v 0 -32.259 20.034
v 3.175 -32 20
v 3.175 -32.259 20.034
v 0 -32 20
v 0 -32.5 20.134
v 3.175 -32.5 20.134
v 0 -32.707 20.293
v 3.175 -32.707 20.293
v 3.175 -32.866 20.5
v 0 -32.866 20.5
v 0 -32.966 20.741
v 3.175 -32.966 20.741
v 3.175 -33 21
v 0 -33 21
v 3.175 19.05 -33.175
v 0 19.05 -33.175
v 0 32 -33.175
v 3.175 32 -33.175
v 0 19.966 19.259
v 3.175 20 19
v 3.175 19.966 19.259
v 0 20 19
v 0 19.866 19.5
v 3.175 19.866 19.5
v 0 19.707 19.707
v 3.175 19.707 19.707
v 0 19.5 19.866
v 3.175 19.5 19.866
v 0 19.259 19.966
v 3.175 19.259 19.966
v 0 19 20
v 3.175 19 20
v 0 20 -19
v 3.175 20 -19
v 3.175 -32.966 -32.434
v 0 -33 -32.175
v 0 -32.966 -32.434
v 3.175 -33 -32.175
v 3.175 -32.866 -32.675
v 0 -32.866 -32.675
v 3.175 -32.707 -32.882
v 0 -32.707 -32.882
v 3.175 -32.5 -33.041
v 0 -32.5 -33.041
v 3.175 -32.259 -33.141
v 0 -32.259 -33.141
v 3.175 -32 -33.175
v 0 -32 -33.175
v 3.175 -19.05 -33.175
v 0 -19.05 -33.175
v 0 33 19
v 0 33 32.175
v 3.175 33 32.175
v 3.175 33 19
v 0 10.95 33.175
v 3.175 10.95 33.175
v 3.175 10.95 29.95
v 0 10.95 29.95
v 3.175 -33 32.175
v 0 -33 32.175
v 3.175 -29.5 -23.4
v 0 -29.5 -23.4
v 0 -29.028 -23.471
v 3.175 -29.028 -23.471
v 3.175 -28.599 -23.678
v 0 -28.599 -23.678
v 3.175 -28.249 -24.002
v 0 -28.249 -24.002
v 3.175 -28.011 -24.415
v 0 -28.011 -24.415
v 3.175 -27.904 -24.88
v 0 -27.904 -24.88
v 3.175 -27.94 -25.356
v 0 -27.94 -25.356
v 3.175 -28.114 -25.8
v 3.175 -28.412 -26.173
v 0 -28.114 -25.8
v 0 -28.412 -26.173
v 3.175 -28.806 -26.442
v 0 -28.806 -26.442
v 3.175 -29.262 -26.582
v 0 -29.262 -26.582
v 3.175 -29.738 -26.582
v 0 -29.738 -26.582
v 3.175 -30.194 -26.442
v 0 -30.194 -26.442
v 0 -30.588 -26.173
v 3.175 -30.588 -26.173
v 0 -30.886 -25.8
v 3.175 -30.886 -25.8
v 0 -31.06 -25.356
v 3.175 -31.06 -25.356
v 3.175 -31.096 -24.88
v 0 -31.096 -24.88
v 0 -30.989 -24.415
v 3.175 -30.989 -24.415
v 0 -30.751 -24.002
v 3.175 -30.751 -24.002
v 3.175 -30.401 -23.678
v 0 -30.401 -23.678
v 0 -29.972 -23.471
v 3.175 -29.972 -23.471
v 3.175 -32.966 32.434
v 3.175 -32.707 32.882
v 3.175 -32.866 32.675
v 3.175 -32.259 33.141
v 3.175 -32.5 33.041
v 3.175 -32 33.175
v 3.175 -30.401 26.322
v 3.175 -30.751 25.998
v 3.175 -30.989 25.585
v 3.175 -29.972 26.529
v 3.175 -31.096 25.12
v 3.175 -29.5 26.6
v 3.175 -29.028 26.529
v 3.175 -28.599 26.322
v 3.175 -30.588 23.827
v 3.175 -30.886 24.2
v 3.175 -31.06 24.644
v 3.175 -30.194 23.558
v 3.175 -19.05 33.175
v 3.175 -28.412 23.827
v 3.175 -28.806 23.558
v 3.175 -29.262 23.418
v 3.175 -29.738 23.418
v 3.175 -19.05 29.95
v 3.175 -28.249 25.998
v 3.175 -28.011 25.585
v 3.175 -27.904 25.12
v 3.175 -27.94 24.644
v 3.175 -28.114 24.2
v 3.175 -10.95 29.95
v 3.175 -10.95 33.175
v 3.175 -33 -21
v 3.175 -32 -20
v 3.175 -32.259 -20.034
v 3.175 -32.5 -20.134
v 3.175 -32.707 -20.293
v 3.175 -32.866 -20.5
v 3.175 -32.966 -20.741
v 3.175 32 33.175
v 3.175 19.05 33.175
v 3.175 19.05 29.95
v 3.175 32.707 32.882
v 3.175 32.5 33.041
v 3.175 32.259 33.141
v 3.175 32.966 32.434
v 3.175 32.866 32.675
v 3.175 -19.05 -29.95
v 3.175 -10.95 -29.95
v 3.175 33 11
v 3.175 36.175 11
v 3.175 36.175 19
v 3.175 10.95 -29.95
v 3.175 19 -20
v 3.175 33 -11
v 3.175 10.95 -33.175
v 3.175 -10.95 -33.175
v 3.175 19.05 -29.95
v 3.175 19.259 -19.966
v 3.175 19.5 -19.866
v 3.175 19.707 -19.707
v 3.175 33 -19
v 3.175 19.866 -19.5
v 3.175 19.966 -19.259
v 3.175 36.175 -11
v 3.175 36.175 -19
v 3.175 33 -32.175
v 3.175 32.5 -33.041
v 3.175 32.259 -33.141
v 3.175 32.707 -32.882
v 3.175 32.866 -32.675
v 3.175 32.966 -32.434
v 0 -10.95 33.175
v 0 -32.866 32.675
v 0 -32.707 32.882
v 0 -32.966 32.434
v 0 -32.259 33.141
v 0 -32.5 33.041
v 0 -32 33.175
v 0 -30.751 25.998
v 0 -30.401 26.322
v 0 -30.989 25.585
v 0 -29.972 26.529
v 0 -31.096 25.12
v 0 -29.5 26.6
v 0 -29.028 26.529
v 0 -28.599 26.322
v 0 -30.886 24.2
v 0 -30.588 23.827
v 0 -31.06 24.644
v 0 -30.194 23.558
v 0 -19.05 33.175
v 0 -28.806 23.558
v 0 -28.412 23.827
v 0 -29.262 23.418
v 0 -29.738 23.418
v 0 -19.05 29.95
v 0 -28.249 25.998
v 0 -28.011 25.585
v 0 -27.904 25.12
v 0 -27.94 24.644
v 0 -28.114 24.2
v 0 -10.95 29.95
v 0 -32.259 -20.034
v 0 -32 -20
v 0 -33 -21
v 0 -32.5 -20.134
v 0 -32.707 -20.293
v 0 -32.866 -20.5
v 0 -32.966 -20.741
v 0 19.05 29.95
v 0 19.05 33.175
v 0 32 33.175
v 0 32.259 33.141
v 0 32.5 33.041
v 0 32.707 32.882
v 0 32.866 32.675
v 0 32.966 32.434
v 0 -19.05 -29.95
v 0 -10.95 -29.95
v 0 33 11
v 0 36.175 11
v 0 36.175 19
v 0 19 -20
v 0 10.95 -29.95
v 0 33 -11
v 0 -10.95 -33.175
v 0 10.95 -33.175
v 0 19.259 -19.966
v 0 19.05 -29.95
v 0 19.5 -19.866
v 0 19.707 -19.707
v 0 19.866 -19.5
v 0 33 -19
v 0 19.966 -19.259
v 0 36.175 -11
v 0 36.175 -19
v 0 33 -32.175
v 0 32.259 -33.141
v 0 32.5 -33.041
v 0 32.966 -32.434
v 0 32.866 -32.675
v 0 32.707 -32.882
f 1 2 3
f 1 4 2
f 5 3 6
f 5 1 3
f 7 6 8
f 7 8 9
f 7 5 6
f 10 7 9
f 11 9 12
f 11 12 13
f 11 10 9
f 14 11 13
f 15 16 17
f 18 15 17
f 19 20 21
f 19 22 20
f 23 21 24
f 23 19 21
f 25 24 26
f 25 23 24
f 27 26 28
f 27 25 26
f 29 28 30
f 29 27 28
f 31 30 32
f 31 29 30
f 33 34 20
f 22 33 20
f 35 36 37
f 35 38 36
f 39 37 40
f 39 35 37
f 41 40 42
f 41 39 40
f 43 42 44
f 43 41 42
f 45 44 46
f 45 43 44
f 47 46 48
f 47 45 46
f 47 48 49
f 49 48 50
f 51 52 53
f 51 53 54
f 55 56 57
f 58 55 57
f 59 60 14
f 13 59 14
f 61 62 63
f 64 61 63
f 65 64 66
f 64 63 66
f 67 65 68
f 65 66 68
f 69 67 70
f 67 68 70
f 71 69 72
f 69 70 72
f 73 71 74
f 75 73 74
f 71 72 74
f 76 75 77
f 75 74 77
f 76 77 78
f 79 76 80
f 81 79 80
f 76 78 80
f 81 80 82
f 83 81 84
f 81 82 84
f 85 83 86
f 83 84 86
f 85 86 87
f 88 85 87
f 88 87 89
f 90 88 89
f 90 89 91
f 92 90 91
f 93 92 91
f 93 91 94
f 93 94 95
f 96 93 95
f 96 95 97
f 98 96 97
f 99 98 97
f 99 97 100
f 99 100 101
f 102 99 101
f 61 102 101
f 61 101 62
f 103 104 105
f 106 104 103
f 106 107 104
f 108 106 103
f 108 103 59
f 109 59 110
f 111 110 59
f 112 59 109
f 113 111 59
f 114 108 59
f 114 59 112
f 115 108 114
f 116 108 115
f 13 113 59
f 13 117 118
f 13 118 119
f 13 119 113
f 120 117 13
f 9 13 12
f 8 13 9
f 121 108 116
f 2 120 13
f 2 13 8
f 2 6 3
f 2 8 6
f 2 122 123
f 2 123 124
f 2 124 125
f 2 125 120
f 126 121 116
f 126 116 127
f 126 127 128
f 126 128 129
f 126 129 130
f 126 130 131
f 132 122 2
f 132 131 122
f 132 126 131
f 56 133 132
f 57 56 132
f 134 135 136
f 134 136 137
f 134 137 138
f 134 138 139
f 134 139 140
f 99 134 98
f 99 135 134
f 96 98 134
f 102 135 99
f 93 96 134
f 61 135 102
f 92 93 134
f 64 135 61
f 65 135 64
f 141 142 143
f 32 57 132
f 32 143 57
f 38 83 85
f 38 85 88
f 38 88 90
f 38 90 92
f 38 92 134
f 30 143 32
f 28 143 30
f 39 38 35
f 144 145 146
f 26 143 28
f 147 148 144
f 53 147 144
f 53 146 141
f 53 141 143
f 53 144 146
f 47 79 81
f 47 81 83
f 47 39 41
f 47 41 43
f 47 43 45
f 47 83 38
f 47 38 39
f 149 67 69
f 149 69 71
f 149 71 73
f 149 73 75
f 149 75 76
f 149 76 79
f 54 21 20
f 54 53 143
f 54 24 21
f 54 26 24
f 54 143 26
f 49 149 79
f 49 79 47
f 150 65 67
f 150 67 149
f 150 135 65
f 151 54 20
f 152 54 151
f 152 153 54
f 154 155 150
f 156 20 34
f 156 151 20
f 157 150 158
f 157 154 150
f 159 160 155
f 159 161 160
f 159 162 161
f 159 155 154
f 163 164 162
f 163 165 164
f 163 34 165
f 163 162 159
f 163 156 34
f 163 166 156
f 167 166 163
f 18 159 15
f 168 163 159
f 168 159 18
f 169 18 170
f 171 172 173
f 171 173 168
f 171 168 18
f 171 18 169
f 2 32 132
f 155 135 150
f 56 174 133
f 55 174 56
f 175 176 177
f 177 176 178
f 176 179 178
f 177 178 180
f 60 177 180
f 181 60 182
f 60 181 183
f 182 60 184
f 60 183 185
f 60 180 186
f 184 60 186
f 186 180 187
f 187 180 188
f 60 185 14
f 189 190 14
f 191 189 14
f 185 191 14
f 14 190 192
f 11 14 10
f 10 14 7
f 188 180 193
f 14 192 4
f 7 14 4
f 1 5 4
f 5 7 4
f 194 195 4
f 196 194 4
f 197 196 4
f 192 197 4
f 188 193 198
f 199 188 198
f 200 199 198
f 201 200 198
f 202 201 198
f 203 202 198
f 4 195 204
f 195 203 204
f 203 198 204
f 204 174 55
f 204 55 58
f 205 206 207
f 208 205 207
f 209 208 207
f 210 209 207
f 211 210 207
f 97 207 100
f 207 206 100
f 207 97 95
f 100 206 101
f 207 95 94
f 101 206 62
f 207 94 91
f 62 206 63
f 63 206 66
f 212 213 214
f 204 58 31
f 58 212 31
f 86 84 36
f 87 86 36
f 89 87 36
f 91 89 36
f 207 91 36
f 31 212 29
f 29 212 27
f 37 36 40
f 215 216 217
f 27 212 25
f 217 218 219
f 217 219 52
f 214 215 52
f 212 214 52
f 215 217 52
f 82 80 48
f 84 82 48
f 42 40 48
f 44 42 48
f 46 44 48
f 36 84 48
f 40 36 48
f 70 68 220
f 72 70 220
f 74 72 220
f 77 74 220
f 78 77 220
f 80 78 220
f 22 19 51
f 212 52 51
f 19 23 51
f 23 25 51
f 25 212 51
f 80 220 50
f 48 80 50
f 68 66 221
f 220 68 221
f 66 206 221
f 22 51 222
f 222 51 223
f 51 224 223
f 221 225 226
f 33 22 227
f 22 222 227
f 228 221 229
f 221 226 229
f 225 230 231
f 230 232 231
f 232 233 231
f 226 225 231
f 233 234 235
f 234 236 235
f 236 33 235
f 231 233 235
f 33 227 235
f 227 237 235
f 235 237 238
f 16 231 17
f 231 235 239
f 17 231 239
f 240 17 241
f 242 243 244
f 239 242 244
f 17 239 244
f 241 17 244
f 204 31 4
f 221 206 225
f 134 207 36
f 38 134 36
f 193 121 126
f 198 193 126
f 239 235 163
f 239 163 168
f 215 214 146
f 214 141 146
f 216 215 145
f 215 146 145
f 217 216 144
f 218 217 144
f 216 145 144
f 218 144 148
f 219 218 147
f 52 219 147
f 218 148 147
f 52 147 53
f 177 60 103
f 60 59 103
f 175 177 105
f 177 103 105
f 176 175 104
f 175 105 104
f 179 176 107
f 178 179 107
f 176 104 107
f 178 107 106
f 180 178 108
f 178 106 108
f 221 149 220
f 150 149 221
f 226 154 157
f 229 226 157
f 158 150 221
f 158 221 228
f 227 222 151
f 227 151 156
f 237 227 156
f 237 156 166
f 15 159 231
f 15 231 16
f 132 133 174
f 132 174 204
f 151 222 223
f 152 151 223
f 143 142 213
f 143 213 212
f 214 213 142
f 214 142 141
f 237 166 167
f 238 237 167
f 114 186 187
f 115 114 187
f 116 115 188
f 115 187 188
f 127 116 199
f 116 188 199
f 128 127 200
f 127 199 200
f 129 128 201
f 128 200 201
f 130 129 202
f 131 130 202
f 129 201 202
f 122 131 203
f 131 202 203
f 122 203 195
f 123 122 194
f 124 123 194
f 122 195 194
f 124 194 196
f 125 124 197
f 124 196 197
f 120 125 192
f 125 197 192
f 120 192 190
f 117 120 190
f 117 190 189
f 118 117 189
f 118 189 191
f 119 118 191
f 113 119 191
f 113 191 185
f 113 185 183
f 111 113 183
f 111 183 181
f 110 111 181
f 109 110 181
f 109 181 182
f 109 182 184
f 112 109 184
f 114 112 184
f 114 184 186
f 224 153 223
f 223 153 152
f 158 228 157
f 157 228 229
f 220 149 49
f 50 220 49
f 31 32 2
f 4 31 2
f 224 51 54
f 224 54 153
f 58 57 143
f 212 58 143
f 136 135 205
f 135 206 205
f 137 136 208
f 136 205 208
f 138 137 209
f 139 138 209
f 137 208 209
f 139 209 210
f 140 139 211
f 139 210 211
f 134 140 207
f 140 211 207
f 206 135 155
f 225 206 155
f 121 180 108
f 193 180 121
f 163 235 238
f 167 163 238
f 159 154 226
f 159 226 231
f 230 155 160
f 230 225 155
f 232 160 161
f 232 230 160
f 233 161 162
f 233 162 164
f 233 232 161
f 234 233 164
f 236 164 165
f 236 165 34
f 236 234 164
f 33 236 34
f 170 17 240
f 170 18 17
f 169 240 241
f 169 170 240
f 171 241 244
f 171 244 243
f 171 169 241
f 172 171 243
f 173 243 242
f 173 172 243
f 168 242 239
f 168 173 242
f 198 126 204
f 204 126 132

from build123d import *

# Parameters (mm, degrees)
SKETCH2_W            = 66.35
SKETCH2_H            = 66
BOSS_EXTRUDE1_DEPTH  = 3.175
CUT_EXTRUDE1_DEPTH   = 47.900546372
M3_CLEARANCE_HOLE1_D = 3.2
SKETCH7_W            = 3.225
SKETCH7_H            = 8.1
CUT_EXTRUDE2_DEPTH   = 47.900546372
SKETCH8_W            = 8
SKETCH8_H            = 3.175
BOSS_EXTRUDE2_DEPTH  = 3.175
FILLET1_R            = 1
FILLET2_R            = 1


with BuildPart() as part:
    # Sketch2 → Boss-Extrude1 (new body)
    with BuildSketch(Plane(origin=(0, 0, 0), x_dir=(0, 0, -1), z_dir=(1, 0, 0))):
        Rectangle(SKETCH2_W, SKETCH2_H)
    extrude(amount=BOSS_EXTRUDE1_DEPTH)

    # Sketch3 → Cut-Extrude1 (cut, through all)
    with BuildSketch(Plane(origin=(3.175, 0, 0), x_dir=(0, 0, -1), z_dir=(1, 0, 0))):
        Polygon((-20, -20), (-20, -33), (20, -33), (20, -20), (20, 20), (-20, 20), align=None)
    extrude(amount=-CUT_EXTRUDE1_DEPTH, mode=Mode.SUBTRACT)

    # M3 Clearance Hole1 (through all)
    with Locations(Plane(origin=(3.175, 0, 0), x_dir=(0, 0, -1), z_dir=(1, 0, 0))):
        with Locations((-25, -29.5), (25, -29.5)):
            Hole(M3_CLEARANCE_HOLE1_D / 2)

    # Sketch7 → Cut-Extrude2 (cut, through all)
    with BuildSketch(Plane(origin=(3.175, 0, 0), x_dir=(0, 0, -1), z_dir=(1, 0, 0))):
        with Locations((-31.5625, 15)):
            Rectangle(SKETCH7_W, SKETCH7_H)
        with Locations((-31.5625, -15)):
            Rectangle(SKETCH7_W, SKETCH7_H)
        with Locations((31.5625, -15)):
            Rectangle(SKETCH7_W, SKETCH7_H)
        with Locations((31.5625, 15)):
            Rectangle(SKETCH7_W, SKETCH7_H)
    extrude(amount=-CUT_EXTRUDE2_DEPTH, mode=Mode.SUBTRACT)

    # Sketch8 → Boss-Extrude2 (add)
    with BuildSketch(Plane(origin=(3.175, 0, 0), x_dir=(0, 0, -1), z_dir=(1, 0, 0))):
        with Locations((-15, 34.5875)):
            Rectangle(SKETCH8_W, SKETCH8_H)
        with Locations((15, 34.5875)):
            Rectangle(SKETCH8_W, SKETCH8_H)
    extrude(amount=-BOSS_EXTRUDE2_DEPTH)

    # Fillet1
    fillet1_edges = [part.edges().sort_by_distance(p)[0] for p in [
        (1.5875, 20, -20),
        (1.5875, 20, 20),
    ]]
    fillet(fillet1_edges, radius=FILLET1_R)

    # Fillet2
    fillet2_edges = [part.edges().sort_by_distance(p)[0] for p in [
        (1.5875, -33, -20),
        (1.5875, -33, 20),
        (1.5875, -33, -33.175),
        (1.5875, -33, 33.175),
        (1.5875, 33, 33.175),
        (1.5875, 33, -33.175),
    ]]
    fillet(fillet2_edges, radius=FILLET2_R)


solid = part.part
